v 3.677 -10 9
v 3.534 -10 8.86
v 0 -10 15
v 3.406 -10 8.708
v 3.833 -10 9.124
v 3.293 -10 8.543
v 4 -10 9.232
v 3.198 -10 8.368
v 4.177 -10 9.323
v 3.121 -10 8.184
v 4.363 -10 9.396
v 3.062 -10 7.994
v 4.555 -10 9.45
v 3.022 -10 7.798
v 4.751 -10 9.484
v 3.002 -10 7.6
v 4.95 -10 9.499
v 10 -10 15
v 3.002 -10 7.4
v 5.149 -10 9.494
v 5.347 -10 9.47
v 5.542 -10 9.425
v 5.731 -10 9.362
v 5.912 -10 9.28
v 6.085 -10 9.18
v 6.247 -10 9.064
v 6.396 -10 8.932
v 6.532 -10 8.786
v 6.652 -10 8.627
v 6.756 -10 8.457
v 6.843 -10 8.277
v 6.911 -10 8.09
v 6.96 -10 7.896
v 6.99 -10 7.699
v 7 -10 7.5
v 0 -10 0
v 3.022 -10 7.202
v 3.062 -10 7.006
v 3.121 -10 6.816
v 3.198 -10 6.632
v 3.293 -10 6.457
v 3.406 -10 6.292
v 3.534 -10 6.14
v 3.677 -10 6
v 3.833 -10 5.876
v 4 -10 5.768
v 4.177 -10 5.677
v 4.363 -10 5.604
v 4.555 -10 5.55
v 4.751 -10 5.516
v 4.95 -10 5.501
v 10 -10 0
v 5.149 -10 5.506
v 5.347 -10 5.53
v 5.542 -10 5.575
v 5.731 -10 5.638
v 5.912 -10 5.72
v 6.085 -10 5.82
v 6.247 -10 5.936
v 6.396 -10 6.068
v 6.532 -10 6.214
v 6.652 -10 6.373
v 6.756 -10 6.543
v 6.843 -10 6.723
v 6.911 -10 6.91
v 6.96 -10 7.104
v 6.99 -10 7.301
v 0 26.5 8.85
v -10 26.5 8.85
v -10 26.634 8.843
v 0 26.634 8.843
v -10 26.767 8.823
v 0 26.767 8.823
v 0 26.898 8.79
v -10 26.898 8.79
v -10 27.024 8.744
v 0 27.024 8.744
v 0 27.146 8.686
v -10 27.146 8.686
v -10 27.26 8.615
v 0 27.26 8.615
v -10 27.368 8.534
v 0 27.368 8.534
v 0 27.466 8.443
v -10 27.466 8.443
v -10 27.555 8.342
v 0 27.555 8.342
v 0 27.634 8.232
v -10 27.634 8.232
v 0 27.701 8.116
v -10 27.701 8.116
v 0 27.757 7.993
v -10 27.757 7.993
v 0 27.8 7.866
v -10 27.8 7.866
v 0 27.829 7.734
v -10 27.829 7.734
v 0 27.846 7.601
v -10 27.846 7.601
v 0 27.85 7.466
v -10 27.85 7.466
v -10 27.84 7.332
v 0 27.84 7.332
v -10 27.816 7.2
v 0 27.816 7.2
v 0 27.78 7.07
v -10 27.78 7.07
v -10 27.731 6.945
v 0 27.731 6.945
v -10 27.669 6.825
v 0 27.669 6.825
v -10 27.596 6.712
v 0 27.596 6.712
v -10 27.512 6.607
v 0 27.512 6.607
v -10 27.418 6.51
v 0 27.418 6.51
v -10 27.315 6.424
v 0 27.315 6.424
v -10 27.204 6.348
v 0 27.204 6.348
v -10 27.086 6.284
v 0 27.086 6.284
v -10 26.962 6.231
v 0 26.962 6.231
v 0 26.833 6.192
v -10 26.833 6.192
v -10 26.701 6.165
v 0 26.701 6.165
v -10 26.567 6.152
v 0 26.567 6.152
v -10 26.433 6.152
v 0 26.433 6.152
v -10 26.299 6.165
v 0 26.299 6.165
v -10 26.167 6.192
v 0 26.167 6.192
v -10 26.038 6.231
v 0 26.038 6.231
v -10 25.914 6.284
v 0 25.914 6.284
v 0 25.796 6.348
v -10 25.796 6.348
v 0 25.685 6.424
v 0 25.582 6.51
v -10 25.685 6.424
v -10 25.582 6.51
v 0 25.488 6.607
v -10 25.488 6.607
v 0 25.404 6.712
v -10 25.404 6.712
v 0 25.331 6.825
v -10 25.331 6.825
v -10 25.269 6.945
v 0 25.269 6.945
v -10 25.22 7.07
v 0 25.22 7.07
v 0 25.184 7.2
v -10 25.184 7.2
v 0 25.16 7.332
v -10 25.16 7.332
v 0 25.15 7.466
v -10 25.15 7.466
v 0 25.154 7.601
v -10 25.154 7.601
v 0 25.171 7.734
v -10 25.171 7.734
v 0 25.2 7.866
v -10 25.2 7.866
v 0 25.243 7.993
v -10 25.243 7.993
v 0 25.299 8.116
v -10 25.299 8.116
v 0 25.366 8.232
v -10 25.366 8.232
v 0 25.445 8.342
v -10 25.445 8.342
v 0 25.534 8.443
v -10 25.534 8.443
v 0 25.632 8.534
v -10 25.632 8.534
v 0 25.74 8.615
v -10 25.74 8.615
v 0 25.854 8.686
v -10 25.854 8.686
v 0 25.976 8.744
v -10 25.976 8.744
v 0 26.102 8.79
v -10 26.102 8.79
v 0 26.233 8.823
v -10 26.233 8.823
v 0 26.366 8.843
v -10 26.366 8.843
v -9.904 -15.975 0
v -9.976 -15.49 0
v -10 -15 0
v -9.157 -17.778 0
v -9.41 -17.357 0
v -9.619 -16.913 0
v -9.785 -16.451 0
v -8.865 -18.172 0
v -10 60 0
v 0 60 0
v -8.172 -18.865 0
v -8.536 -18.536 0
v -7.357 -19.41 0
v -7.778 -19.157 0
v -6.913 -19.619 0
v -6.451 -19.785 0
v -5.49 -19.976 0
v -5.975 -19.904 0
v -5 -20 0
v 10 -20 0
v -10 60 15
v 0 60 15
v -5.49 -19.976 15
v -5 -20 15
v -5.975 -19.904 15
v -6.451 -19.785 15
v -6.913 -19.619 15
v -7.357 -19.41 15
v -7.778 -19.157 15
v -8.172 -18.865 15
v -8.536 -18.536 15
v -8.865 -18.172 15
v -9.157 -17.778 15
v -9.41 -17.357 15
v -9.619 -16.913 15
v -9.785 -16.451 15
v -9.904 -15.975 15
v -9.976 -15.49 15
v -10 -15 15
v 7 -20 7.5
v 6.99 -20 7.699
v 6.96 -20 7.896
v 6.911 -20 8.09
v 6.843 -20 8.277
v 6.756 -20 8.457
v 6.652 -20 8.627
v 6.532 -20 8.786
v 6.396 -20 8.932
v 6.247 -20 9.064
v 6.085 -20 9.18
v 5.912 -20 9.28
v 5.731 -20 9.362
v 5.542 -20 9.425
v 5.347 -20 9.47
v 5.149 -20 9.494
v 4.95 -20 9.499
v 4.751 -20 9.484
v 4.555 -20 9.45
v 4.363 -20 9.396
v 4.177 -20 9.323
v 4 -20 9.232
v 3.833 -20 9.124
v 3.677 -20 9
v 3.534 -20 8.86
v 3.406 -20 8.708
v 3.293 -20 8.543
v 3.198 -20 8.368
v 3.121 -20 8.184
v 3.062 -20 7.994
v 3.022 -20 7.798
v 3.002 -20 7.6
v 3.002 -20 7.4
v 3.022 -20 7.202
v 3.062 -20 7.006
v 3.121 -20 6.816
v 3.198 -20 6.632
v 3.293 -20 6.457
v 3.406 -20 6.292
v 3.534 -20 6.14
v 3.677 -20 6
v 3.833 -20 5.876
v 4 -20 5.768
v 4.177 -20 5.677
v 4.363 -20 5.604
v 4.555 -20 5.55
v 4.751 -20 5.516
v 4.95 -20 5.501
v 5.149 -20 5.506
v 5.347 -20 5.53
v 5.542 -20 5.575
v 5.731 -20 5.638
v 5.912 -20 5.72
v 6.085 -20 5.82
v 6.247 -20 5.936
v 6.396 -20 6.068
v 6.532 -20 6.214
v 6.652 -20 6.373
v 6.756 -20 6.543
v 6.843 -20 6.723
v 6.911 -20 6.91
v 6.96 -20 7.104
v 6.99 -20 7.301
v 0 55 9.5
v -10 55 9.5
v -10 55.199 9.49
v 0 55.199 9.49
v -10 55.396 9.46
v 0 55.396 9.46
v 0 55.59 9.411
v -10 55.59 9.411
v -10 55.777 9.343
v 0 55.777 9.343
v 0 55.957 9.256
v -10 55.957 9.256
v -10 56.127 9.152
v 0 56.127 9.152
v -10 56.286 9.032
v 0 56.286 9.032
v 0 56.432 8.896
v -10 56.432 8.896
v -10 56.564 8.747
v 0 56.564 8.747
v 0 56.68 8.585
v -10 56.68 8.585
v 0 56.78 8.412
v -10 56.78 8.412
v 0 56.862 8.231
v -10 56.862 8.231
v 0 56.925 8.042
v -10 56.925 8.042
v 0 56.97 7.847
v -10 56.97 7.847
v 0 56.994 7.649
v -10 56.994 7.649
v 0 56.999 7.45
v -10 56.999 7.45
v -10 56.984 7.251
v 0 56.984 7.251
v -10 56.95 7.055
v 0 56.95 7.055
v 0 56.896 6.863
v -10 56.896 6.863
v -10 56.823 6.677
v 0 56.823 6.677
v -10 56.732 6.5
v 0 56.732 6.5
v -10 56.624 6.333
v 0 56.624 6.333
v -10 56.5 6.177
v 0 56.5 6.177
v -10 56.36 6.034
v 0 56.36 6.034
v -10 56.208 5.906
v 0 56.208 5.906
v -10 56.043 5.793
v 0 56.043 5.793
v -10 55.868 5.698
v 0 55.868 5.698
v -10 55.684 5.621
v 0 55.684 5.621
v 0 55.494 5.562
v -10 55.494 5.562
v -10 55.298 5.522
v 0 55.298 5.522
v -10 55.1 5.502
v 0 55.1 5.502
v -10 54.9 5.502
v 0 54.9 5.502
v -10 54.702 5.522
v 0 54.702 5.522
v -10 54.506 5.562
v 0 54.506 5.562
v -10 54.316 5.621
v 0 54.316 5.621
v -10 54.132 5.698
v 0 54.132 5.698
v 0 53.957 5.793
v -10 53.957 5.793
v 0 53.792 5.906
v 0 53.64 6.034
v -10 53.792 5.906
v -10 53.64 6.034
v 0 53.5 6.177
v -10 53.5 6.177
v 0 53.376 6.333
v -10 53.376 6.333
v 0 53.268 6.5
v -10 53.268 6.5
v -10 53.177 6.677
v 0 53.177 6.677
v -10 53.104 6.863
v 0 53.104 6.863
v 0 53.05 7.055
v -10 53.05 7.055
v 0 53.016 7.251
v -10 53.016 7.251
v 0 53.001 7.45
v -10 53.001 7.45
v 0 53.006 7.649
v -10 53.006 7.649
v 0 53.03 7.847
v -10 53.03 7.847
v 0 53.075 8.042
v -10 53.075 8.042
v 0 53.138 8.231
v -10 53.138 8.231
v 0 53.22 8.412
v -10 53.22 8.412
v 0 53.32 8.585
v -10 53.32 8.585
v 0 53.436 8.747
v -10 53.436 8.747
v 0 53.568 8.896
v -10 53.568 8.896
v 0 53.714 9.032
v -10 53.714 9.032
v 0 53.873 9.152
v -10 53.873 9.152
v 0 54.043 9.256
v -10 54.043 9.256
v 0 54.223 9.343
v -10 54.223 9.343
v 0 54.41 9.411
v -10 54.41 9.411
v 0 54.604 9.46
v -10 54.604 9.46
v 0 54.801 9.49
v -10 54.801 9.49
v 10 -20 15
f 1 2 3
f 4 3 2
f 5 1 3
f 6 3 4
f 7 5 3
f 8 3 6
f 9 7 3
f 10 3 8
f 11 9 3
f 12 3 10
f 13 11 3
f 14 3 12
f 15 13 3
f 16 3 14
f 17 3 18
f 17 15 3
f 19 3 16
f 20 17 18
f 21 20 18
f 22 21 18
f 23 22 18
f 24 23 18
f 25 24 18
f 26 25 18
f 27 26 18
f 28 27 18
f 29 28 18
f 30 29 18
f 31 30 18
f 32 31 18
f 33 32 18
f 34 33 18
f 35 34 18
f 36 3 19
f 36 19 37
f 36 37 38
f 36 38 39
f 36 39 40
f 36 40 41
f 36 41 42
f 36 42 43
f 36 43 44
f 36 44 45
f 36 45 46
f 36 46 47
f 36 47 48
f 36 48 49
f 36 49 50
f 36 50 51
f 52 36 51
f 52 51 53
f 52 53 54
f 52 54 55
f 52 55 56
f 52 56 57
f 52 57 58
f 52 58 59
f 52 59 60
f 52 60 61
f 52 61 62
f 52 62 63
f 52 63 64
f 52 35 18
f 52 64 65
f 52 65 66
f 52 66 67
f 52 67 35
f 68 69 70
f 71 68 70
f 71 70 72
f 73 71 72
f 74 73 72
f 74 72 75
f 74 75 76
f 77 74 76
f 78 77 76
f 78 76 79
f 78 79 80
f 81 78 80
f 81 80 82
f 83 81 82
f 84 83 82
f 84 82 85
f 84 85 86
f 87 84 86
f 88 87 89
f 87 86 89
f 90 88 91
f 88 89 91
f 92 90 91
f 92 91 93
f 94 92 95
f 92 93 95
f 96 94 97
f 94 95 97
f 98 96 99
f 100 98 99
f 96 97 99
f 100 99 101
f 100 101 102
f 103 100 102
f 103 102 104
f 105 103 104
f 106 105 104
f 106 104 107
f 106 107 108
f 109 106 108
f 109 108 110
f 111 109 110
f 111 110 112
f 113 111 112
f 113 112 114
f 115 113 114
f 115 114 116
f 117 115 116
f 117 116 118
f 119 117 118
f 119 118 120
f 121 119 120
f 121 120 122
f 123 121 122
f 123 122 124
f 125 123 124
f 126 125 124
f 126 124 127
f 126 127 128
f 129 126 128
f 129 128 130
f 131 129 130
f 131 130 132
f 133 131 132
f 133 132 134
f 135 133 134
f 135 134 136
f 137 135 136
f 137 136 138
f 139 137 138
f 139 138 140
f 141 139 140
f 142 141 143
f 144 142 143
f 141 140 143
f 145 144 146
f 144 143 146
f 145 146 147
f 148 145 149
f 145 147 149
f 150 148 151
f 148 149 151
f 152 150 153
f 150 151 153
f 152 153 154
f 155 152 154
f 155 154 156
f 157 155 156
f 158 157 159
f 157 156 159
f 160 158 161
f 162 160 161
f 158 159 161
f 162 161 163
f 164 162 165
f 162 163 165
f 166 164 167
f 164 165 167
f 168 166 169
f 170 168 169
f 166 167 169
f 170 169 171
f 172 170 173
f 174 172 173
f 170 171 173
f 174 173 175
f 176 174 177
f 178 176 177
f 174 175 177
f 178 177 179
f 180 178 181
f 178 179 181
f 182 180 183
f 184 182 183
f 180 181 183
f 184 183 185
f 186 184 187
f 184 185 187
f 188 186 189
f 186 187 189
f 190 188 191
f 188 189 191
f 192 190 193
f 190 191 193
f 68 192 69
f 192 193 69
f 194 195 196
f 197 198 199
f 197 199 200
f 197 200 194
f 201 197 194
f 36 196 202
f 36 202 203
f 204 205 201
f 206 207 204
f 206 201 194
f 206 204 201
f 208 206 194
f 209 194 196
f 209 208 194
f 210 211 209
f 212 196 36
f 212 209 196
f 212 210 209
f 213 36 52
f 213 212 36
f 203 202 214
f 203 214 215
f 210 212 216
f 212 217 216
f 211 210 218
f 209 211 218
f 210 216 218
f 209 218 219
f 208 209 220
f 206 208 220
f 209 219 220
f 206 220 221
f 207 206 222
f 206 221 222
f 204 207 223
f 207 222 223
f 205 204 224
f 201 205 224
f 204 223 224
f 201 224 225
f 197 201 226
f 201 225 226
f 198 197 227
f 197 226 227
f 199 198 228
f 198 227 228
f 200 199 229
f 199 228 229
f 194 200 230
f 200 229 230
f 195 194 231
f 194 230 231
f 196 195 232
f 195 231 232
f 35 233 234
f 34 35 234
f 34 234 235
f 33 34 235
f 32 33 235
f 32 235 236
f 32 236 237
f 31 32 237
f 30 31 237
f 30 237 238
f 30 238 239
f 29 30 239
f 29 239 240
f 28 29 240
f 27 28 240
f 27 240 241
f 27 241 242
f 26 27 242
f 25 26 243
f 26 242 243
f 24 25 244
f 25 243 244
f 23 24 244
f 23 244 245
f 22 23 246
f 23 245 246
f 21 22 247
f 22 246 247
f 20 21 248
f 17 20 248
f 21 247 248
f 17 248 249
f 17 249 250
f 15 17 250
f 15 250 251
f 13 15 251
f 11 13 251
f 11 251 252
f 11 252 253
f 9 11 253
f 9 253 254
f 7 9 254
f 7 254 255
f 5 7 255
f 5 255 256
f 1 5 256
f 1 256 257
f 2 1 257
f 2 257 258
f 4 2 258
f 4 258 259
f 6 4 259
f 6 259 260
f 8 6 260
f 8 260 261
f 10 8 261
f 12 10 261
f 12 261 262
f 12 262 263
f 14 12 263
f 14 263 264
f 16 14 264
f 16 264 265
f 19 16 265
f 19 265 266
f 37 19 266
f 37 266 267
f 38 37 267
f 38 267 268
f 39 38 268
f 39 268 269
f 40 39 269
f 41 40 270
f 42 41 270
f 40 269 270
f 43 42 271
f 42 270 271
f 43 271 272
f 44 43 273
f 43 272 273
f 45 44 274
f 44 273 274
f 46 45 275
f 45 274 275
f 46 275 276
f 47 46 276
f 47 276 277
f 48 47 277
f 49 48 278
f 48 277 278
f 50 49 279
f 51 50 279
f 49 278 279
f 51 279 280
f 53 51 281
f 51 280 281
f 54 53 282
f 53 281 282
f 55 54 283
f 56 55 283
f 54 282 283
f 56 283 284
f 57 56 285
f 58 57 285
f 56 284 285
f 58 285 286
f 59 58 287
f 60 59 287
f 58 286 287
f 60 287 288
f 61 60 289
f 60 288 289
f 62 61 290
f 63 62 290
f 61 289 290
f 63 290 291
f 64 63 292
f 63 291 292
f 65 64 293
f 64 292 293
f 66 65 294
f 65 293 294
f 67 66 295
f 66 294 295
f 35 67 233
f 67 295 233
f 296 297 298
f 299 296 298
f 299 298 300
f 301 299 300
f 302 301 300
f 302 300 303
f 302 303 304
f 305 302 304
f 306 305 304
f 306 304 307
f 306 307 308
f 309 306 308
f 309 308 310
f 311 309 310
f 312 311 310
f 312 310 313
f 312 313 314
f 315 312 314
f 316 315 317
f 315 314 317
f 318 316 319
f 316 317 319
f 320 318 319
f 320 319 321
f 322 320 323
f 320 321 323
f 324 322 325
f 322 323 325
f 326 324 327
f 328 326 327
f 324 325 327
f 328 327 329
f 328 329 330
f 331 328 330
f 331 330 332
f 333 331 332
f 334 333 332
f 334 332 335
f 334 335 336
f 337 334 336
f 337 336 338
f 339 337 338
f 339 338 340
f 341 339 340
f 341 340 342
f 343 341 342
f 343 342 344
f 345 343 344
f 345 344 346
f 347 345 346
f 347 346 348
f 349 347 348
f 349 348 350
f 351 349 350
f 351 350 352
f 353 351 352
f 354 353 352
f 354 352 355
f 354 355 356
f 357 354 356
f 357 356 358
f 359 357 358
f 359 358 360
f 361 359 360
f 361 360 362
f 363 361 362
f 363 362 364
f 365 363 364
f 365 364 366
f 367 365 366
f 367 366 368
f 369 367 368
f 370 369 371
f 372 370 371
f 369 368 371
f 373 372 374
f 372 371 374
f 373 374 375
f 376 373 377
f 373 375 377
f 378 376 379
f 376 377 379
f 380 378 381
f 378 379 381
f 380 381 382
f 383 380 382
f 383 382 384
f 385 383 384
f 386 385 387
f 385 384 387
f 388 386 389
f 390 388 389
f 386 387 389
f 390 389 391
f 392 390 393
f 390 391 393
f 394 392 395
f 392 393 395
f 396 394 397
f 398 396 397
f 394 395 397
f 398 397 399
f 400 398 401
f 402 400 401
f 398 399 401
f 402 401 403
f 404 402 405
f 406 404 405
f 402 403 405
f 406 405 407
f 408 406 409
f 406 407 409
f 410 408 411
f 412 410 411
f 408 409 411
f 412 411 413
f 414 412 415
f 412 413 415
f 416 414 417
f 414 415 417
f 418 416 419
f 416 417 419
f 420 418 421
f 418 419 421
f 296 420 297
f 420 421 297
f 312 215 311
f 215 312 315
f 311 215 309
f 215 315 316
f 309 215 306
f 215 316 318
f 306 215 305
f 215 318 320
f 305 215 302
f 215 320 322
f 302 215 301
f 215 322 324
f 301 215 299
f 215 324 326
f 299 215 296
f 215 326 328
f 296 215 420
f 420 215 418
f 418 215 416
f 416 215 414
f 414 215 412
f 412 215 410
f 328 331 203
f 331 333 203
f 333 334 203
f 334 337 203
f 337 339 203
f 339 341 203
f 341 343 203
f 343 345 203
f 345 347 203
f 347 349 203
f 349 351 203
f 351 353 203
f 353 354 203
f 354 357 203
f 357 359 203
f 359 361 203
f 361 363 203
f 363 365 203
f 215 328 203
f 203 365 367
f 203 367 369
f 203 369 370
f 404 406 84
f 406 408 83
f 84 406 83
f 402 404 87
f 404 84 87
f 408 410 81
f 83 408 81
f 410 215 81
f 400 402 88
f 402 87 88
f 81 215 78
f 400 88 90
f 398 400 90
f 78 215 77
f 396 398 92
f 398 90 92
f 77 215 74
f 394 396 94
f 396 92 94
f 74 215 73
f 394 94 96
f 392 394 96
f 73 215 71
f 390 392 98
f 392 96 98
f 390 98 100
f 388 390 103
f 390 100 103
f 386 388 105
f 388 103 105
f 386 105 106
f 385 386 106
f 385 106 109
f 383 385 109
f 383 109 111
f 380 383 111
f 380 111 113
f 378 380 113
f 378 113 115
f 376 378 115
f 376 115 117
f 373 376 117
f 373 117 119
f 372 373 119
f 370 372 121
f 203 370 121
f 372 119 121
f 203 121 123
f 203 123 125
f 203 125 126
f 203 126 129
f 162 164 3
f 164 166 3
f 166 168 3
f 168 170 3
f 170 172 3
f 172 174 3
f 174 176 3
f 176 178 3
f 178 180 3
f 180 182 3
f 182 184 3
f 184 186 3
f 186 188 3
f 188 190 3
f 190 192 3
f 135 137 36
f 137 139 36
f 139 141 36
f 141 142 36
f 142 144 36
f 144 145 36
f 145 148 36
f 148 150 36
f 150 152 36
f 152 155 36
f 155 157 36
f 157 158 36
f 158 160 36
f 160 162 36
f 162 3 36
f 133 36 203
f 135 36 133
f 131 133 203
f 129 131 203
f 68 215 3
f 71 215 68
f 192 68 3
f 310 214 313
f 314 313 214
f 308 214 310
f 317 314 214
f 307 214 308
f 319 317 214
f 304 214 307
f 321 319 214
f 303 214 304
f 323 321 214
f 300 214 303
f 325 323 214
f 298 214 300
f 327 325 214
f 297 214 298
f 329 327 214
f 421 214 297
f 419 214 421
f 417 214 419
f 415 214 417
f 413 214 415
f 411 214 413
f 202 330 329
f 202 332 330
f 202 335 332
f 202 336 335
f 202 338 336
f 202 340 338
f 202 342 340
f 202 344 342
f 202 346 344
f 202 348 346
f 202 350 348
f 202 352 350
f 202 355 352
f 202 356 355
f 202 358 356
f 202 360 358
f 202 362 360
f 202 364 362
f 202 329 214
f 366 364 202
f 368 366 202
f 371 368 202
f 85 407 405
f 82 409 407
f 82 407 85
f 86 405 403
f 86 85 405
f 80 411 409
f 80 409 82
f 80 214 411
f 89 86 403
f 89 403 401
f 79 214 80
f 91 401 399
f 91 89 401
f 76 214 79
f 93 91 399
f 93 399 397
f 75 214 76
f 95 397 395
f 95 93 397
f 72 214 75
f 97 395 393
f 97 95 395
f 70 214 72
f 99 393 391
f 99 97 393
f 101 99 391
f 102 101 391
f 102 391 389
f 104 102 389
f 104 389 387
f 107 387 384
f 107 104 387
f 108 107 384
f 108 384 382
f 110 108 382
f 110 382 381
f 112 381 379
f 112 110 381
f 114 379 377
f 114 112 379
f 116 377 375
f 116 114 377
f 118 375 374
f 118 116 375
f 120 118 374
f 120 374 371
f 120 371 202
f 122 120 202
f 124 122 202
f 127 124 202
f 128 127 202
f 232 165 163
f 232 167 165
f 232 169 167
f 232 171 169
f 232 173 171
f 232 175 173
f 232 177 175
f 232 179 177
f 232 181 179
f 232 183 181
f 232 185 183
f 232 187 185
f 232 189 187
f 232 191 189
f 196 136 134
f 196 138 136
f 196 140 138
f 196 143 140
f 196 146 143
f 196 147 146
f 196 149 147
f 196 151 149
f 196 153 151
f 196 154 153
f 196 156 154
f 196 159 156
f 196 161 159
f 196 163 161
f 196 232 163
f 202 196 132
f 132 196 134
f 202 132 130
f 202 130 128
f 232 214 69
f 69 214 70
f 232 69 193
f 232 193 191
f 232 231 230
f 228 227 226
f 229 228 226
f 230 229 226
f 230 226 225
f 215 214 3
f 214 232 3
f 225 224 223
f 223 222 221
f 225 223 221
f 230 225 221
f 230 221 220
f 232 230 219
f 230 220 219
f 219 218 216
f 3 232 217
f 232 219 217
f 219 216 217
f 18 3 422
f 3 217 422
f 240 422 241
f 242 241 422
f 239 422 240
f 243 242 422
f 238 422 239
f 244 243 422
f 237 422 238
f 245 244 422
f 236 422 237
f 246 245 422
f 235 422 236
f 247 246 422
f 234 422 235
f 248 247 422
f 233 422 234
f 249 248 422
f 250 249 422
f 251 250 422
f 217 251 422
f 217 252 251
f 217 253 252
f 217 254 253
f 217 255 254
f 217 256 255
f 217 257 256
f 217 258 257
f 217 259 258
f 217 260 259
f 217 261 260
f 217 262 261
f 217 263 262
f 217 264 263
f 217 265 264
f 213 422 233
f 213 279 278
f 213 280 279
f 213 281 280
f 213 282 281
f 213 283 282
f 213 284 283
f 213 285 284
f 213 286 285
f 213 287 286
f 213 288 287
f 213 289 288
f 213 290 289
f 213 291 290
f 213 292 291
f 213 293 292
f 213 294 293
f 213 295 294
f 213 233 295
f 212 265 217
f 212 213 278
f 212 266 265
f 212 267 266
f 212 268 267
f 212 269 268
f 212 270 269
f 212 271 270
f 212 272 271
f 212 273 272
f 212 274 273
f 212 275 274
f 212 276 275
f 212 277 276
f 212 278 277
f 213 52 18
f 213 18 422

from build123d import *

# Parameters (mm, degrees)
BOSS_EXTRUDE1_DEPTH = 15
FILLET1_R           = 5
SKETCH2_W           = 10
SKETCH2_H           = 15
BOSS_EXTRUDE2_DEPTH = 40
SKETCH3_R           = 2
CUT_EXTRUDE1_DEPTH  = 81
SKETCH4_R           = 2
CUT_EXTRUDE2_DEPTH  = 21
SKETCH5_R           = 1.35
CUT_EXTRUDE3_DEPTH  = 21


with BuildPart() as part:
    # Sketch1 → Boss-Extrude1 (new body)
    with BuildSketch(Plane.XY):
        Polygon((0, 20), (0, -10), (10, -10), (10, -20), (-10, -20), (-10, 20), align=None)
    extrude(amount=BOSS_EXTRUDE1_DEPTH)

    # Fillet1
    fillet1_edges = [part.edges().sort_by_distance(p)[0] for p in [
        (-10, -20, 7.5),
    ]]
    fillet(fillet1_edges, radius=FILLET1_R)

    # Sketch2 → Boss-Extrude2 (add)
    with BuildSketch(Plane(origin=(0, 20, 0), x_dir=(1, 0, 0), z_dir=(0, 1, 0))):
        with Locations((-5, -7.5)):
            Rectangle(SKETCH2_W, SKETCH2_H)
    extrude(amount=BOSS_EXTRUDE2_DEPTH)

    # Sketch3 → Cut-Extrude1 (cut, through all)
    with BuildSketch(Plane.XZ.offset(20)):
        with Locations((5, 7.5)):
            Circle(SKETCH3_R)
    extrude(amount=-CUT_EXTRUDE1_DEPTH, mode=Mode.SUBTRACT)

    # Sketch4 → Cut-Extrude2 (cut, through all)
    with BuildSketch(Plane.ZY.offset(10)):
        with Locations((7.5, 55)):
            Circle(SKETCH4_R)
    extrude(amount=-CUT_EXTRUDE2_DEPTH, mode=Mode.SUBTRACT)

    # Sketch5 → Cut-Extrude3 (cut, through all)
    with BuildSketch(Plane.ZY.offset(10)):
        with Locations((7.5, 26.5)):
            Circle(SKETCH5_R)
    extrude(amount=-CUT_EXTRUDE3_DEPTH, mode=Mode.SUBTRACT)


solid = part.part
